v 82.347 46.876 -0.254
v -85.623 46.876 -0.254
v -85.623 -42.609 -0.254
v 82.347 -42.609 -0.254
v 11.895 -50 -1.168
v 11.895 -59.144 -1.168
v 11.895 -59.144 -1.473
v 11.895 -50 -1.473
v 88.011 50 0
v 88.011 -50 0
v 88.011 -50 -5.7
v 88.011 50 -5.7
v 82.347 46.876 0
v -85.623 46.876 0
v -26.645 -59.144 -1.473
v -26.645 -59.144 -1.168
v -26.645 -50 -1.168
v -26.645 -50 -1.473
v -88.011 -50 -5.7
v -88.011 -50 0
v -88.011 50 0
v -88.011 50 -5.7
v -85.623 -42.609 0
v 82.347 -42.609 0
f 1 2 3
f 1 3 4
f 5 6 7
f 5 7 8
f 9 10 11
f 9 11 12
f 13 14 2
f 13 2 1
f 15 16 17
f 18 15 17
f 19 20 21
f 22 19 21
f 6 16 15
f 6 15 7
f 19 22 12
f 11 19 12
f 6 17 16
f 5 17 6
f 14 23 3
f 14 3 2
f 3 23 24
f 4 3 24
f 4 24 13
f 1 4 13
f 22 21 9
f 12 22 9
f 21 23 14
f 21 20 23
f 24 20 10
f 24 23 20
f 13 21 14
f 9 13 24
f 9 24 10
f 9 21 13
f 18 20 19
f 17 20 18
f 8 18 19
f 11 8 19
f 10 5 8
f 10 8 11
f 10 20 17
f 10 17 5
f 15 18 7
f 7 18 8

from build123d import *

# Parameters (mm, degrees)
SKETCH1_W           = 176.022
SKETCH1_H           = 100
BOSS_EXTRUDE1_DEPTH = 5.7
SKETCH1_3_W         = 167.9702
SKETCH1_3_H         = 89.4844
CUT_EXTRUDE1_DEPTH  = 0.254
BOSS_EXTRUDE2_START = -1.1684
SKETCH2_W           = 38.53942
SKETCH2_H           = 9.144
BOSS_EXTRUDE2_DEPTH = 0.3048


with BuildPart() as part:
    # Sketch1 → Boss-Extrude1 (new body)
    with BuildSketch(Plane.XY):
        Rectangle(SKETCH1_W, SKETCH1_H)
    extrude(amount=-BOSS_EXTRUDE1_DEPTH)

    # Sketch1<3> → Cut-Extrude1 (cut)
    with BuildSketch(Plane.XY):
        with Locations((-1.6383, 2.1336)):
            Rectangle(SKETCH1_3_W, SKETCH1_3_H)
    extrude(amount=-CUT_EXTRUDE1_DEPTH, mode=Mode.SUBTRACT)

    # Sketch2 → Boss-Extrude2 (add)
    with BuildSketch(Plane.XY.offset(BOSS_EXTRUDE2_START)):
        with Locations((-7.37489, -54.572)):
            Rectangle(SKETCH2_W, SKETCH2_H)
    extrude(amount=-BOSS_EXTRUDE2_DEPTH)


solid = part.part
